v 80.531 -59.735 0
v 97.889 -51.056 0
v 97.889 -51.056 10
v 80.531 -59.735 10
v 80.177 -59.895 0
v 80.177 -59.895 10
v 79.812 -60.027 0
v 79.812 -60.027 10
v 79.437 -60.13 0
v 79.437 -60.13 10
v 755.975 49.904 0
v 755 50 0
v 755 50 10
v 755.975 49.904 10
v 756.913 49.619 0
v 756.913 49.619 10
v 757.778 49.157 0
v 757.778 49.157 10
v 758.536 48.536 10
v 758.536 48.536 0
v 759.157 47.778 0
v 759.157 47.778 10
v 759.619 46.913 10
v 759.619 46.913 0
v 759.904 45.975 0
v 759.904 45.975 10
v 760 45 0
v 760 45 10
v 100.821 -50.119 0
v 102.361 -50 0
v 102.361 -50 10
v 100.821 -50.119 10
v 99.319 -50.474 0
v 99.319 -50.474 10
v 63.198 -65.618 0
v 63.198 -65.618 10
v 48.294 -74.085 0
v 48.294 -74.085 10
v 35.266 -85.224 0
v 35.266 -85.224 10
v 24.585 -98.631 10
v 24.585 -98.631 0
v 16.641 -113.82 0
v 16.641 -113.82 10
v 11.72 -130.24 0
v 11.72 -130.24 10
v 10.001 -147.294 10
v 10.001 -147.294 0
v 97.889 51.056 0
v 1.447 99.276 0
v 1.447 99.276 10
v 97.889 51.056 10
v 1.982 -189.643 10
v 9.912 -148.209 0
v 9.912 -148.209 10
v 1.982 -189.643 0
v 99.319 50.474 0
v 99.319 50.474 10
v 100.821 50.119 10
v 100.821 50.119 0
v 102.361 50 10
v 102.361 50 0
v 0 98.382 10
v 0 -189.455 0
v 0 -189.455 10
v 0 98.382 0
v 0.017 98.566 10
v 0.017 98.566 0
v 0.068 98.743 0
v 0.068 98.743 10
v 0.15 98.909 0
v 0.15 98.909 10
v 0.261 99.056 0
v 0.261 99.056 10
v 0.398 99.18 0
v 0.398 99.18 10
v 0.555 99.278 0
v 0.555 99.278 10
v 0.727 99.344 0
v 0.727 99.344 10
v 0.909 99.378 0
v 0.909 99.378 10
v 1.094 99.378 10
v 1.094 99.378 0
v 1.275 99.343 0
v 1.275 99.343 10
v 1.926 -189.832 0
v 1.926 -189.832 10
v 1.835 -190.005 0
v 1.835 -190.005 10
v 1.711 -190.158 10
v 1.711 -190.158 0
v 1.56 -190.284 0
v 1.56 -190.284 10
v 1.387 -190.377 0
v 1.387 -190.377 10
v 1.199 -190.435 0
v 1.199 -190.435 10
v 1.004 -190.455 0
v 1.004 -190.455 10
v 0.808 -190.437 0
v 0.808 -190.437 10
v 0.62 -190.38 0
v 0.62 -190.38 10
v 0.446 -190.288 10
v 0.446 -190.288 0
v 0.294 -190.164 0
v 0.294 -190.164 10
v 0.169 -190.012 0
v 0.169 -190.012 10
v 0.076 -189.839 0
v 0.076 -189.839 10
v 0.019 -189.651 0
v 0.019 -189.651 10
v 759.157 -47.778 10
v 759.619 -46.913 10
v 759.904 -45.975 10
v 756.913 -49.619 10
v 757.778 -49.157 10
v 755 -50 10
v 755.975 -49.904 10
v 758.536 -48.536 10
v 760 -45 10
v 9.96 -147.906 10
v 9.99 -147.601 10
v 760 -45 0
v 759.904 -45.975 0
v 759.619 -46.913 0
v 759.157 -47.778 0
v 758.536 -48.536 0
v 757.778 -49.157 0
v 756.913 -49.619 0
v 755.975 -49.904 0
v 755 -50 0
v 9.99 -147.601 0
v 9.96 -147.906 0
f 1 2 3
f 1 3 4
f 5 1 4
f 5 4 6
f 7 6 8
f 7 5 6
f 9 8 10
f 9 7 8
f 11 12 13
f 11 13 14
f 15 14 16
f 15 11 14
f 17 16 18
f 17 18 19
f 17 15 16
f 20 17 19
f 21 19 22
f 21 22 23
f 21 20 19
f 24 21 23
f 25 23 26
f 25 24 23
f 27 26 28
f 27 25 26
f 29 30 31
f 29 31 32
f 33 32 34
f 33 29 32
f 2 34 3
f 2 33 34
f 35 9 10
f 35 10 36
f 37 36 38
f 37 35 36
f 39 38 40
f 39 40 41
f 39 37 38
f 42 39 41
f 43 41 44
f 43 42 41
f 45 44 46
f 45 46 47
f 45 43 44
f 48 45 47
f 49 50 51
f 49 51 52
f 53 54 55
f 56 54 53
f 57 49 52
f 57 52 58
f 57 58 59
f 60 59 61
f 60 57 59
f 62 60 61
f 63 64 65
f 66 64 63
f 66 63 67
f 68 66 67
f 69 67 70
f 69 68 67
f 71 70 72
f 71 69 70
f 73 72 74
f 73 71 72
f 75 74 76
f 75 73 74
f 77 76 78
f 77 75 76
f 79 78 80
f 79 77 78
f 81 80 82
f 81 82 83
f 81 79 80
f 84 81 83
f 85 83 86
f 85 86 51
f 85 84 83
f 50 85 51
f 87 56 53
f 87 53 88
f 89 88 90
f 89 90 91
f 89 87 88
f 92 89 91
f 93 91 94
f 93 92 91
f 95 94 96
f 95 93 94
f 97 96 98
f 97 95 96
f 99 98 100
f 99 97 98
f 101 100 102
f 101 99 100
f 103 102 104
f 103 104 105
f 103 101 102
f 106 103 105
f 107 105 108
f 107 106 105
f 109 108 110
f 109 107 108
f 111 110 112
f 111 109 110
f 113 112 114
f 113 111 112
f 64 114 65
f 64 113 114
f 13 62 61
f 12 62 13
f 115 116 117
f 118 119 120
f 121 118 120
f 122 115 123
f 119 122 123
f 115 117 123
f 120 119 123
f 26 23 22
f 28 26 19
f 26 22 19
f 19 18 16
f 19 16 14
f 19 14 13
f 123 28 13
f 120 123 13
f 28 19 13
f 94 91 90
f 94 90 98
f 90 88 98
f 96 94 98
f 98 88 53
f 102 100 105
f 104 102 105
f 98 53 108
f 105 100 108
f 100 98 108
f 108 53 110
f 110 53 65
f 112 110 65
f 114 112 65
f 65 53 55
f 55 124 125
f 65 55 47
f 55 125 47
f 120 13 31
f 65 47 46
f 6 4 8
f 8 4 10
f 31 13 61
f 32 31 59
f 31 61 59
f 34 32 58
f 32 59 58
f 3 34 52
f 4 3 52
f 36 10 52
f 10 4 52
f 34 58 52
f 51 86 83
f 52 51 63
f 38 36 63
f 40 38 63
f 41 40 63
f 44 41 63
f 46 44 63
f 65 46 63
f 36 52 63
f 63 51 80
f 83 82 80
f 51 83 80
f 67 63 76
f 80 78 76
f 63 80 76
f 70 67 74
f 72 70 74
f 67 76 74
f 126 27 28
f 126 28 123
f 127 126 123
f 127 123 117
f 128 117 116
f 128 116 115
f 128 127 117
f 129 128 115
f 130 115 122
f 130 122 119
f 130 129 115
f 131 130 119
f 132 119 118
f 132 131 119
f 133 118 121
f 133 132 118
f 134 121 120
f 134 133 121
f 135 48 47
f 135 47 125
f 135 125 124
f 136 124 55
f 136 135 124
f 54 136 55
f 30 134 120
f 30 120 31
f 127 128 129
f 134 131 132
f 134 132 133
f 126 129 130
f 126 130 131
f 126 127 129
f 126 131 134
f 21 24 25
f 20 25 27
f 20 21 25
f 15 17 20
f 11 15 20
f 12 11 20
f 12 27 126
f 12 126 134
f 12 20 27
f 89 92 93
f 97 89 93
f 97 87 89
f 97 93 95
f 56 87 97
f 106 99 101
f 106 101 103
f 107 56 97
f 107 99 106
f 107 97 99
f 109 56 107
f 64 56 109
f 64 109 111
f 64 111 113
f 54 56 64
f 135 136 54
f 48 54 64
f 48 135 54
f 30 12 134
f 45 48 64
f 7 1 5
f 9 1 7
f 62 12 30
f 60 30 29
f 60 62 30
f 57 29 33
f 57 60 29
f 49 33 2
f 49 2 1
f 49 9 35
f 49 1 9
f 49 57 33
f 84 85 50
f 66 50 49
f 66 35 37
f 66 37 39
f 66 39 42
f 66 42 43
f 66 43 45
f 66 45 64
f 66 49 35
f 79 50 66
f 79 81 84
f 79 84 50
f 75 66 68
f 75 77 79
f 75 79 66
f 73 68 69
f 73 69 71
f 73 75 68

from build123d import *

# Parameters (mm, degrees)
BOSS_EXTRUDE1_DEPTH = 10


with BuildPart() as part:
    # Sketch1 → Boss-Extrude1 (new body)
    with BuildSketch(Plane.XY):
        with BuildLine():
            Line((1.447213595, 99.276393202), (97.88854382, 51.05572809))
            ThreePointArc((97.88854382, 51.05572809), (100.06315057, 50.267510105), (102.360679775, 50))
            Line((102.360679775, 50), (755, 50))
            ThreePointArc((755, 50), (758.535533906, 48.535533906), (760, 45))
            Line((760, 45), (760, -45.000000001))
            ThreePointArc((760, -45.000000001), (758.535533906, -48.535533907), (755, -50.000000001))
            Line((755, -50.000000001), (102.360679777, -50.000000001))
            ThreePointArc((102.360679777, -50.000000001), (100.06315057, -50.267510107), (97.888543818, -51.055728093))
            Line((97.888543818, -51.055728093), (80.530859307, -59.734570358))
            ThreePointArc((80.530859307, -59.734570358), (79.995557001, -59.964284692), (79.437170731, -60.130182272))
            ThreePointArc((79.437170731, -60.130182272), (29.605594549, -91.672663918), (10.00115127, -147.294421683))
            ThreePointArc((10.00115127, -147.294421683), (9.977672992, -147.753763522), (9.912084694, -148.209004479))
            Line((9.912084694, -148.209004479), (1.982173893, -189.643070819))
            ThreePointArc((1.982173893, -189.643070819), (0.90559103, -190.450629734), (0, -189.455096236))
            Line((0, -189.455096236), (0, 98.381966011))
            ThreePointArc((0, 98.381966011), (0.474268888, 99.23261682), (1.447213595, 99.276393202))
        make_face()
    extrude(amount=BOSS_EXTRUDE1_DEPTH)


solid = part.part
